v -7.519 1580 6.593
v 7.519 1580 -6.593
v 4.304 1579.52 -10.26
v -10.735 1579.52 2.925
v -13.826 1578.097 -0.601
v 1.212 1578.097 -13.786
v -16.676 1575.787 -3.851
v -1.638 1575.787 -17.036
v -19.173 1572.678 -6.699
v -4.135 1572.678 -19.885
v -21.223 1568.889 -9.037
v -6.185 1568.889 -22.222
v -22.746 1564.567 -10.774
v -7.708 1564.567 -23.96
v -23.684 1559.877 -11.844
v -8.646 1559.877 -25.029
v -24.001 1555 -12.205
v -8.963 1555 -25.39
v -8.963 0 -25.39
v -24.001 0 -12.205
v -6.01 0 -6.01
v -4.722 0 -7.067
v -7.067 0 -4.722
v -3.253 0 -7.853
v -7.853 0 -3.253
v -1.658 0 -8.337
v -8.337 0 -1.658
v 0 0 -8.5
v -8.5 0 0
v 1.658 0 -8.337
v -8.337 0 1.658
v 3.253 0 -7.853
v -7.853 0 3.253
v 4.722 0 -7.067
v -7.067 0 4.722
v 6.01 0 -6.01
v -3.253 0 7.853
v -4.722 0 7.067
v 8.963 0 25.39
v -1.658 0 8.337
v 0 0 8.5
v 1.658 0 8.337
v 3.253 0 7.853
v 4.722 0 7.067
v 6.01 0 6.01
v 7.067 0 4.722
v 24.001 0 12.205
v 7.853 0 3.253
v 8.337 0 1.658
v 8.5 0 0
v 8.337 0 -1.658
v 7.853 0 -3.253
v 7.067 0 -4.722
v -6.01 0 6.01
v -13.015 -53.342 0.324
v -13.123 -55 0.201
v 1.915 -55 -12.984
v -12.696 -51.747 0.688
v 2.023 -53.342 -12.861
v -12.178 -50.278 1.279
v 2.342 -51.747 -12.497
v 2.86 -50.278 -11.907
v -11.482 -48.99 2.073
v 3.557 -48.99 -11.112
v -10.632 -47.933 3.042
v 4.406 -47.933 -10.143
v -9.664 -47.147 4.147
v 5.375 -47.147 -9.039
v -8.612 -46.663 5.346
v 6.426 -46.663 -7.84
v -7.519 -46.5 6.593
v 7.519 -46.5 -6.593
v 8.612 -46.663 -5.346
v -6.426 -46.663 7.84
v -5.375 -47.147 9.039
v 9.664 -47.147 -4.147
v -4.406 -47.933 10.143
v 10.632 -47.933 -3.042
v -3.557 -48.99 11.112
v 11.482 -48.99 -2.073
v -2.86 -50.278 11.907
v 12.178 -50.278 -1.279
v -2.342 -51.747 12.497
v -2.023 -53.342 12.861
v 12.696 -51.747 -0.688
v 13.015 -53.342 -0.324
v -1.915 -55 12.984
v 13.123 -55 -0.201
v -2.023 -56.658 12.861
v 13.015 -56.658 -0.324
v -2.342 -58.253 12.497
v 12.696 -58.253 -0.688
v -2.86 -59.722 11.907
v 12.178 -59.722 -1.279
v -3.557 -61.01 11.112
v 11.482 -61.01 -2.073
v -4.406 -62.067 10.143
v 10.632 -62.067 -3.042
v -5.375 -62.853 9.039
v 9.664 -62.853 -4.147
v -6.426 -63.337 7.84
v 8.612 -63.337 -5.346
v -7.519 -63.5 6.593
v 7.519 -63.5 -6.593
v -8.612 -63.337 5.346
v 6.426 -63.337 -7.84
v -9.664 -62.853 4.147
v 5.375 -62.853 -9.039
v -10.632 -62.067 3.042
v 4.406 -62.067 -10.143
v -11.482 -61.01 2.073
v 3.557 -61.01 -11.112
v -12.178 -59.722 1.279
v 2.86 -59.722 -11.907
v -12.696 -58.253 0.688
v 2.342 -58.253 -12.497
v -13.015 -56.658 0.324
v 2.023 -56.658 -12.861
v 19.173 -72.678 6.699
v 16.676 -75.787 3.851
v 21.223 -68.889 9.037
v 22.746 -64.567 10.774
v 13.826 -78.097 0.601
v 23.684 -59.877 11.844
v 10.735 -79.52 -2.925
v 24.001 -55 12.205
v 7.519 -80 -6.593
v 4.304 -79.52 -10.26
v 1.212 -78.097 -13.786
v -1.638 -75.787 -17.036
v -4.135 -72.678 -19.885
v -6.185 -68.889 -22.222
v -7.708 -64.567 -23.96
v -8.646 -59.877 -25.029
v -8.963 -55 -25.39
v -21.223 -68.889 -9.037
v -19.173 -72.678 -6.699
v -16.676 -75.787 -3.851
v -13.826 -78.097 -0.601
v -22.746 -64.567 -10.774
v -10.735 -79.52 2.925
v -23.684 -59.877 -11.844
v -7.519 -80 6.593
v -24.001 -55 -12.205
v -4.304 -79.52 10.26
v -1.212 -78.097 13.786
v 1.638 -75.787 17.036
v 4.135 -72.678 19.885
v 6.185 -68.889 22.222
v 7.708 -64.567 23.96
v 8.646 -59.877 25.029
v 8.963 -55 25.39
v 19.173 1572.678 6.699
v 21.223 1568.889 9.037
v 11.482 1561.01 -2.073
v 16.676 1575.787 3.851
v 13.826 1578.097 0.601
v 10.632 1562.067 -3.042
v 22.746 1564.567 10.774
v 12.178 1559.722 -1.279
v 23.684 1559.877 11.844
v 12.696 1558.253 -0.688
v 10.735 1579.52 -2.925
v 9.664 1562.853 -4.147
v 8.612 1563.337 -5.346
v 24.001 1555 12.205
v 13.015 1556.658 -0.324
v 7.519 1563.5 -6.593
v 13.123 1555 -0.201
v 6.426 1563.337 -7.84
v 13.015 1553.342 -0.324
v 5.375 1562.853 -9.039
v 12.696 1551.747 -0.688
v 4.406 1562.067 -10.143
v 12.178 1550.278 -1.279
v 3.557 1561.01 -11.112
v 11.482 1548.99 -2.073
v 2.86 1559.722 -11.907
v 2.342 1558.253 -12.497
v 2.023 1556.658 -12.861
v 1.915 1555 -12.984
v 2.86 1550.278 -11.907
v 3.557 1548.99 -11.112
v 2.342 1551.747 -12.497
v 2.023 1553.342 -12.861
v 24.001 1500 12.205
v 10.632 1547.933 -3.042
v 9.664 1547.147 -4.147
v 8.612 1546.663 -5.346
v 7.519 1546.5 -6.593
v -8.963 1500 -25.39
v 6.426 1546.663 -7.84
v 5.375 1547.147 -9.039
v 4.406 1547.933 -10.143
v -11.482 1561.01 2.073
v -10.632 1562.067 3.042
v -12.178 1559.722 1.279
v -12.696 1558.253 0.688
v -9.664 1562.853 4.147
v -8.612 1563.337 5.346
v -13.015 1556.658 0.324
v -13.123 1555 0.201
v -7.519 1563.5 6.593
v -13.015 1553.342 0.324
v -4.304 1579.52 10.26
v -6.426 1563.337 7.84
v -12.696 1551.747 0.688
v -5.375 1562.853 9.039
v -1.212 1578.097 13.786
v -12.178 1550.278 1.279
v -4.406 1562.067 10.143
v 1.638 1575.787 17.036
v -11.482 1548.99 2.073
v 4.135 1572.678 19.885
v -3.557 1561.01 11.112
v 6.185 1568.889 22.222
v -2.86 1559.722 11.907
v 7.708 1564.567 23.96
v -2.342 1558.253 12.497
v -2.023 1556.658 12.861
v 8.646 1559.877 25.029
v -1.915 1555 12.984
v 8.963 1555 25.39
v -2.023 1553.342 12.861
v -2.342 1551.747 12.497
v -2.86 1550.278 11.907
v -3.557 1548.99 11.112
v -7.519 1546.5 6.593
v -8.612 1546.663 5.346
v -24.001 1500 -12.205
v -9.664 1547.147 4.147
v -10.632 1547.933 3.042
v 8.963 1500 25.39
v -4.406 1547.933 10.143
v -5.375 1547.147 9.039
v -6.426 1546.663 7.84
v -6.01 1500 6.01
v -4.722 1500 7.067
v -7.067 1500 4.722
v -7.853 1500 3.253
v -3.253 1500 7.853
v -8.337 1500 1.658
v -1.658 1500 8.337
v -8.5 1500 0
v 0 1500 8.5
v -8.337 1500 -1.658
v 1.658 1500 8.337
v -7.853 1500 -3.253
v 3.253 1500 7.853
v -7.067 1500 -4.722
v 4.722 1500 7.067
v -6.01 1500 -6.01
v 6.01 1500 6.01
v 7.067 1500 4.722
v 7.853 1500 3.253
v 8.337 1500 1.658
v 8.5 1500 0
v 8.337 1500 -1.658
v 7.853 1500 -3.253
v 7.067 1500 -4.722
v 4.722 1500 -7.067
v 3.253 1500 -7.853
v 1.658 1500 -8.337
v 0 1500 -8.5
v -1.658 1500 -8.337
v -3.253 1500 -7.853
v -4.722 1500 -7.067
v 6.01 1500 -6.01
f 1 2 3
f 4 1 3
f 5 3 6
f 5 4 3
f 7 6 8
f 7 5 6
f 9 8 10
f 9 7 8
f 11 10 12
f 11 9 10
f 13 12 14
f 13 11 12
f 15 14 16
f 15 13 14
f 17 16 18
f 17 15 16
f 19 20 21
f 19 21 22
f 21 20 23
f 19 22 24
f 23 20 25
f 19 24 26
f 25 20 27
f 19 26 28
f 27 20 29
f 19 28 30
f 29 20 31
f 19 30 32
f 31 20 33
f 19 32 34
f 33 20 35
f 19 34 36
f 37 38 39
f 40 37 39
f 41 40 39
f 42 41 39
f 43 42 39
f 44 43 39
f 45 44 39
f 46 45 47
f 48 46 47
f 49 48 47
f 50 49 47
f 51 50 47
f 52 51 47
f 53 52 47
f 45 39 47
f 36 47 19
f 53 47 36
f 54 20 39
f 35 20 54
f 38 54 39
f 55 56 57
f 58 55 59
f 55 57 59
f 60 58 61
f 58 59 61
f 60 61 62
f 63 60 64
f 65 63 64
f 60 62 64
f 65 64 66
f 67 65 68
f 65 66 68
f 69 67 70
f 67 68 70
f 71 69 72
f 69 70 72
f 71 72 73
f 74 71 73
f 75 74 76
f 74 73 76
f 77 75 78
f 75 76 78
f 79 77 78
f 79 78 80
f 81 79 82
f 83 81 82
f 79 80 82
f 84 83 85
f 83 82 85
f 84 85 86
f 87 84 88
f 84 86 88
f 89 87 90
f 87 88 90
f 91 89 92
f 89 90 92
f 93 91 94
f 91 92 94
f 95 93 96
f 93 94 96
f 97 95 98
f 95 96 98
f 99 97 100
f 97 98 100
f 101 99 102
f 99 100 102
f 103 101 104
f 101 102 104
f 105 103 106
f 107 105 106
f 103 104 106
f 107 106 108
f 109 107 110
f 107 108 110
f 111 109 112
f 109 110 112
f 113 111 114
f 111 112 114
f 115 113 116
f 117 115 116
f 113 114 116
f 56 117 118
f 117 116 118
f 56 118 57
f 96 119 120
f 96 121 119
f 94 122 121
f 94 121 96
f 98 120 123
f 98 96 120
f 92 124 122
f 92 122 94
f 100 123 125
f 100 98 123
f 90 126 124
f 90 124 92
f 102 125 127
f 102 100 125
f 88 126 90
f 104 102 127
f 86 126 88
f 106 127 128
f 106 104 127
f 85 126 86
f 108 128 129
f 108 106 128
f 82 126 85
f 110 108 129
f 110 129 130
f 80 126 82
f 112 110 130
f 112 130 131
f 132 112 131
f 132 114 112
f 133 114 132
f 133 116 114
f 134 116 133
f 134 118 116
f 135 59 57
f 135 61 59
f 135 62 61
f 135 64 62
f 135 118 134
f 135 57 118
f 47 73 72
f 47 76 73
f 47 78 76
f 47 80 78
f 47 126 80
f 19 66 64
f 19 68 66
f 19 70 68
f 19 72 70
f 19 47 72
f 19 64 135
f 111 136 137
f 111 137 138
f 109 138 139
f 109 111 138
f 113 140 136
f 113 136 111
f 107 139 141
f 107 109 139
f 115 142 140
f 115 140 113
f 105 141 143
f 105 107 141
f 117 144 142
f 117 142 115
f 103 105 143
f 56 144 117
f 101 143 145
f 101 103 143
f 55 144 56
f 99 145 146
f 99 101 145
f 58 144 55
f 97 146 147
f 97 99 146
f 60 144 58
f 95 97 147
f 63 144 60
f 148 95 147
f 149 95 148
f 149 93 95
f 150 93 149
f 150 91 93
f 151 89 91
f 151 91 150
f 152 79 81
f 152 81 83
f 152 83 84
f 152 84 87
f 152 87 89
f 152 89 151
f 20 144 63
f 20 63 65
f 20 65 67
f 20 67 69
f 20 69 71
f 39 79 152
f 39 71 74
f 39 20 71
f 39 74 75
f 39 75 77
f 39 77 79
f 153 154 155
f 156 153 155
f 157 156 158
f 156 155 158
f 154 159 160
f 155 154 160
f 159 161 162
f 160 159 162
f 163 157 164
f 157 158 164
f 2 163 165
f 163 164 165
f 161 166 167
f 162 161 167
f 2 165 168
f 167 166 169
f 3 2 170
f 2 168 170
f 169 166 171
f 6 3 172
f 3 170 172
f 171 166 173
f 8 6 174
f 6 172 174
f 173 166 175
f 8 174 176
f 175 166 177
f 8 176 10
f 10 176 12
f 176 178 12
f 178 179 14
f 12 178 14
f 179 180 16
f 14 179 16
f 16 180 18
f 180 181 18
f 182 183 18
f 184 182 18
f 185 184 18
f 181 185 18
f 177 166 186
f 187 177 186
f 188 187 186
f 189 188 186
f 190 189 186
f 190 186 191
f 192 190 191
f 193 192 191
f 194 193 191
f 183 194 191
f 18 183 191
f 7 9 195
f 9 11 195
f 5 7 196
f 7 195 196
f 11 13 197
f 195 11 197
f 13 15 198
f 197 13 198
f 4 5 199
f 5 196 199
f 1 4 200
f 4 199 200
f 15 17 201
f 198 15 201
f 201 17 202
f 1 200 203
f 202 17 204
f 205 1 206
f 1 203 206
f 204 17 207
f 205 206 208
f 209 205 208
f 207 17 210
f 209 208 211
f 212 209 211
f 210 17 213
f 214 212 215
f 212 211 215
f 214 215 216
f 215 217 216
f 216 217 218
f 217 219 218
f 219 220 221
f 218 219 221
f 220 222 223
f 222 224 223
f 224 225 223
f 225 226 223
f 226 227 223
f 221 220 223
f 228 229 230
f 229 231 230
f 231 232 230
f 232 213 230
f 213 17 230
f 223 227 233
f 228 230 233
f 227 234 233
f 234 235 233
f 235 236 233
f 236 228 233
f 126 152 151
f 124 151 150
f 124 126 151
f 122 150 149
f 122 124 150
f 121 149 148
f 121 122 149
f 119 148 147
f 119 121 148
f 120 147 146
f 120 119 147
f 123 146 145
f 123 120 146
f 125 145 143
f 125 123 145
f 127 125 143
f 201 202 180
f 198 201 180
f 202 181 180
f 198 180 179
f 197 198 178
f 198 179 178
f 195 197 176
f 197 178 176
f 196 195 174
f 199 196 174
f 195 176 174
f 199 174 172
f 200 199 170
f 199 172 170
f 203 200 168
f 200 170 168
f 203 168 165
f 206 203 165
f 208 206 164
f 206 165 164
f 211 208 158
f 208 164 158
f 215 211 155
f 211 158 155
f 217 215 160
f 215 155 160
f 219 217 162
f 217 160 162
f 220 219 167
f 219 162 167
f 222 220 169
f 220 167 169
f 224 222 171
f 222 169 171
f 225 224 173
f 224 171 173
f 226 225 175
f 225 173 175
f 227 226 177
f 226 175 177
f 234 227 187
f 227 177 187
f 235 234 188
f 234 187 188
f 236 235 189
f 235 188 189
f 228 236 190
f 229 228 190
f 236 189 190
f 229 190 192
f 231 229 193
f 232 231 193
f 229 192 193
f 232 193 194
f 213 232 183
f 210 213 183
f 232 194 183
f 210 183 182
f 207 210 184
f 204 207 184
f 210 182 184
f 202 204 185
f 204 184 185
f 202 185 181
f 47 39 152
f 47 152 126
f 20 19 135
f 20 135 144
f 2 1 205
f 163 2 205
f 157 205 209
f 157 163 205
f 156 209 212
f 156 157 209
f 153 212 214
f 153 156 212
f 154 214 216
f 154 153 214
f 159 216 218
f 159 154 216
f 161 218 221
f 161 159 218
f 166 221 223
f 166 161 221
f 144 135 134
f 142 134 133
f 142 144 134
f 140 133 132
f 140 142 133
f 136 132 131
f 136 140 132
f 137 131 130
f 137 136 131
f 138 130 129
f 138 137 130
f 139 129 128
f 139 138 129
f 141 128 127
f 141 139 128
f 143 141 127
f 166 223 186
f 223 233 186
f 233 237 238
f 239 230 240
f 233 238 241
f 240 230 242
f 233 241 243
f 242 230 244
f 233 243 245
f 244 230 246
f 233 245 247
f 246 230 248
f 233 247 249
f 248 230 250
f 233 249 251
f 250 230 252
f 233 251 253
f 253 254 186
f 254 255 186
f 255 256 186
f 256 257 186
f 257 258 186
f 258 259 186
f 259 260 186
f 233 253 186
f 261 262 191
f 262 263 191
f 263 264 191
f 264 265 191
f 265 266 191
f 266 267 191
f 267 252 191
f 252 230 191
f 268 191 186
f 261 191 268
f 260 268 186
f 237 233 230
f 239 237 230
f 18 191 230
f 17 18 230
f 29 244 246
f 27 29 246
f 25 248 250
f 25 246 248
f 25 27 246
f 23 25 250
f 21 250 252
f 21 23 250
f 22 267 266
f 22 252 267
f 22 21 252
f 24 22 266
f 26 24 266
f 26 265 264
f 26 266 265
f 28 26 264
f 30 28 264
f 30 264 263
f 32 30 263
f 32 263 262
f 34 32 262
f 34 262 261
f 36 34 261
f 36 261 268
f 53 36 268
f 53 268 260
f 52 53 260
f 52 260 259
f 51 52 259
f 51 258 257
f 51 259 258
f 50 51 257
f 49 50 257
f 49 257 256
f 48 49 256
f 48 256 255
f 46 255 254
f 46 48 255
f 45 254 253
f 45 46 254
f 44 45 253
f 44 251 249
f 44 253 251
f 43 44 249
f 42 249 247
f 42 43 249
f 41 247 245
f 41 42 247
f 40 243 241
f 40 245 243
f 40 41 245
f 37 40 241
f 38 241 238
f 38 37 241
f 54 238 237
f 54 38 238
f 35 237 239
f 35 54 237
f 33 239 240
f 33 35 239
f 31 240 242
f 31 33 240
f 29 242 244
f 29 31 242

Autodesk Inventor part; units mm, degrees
ref_plane "YZ Plane" through (0, 0, 0) normal (1, 0, 0) x (0, 1, 0)
ref_plane "XZ Plane" through (0, 0, 0) normal (0, 1, 0) x (-1, 0, 0)
ref_plane "XY Plane" through (0, 0, 0) normal (0, 0, 1) x (1, 0, 0)
sketch "Boceto1" plane through (0, 0, 0) normal (0, 1, 0) x (-1, 0, 0)
  circle A0 centre (0, 0) radius 8.5
  dimension "d0" = 17
extrude "Extrusión1" add sketch "Boceto1" along normal blind 1500
sketch "Boceto2" plane through (0, 1500, 0) normal (0, 1, 0) x (1, 0, 0)
  line L0 (24.0008, -12.205) -> (-8.9626, 25.3904)
  line L1 (-8.9626, 25.3904) -> (-24.0008, 12.205)
  line L2 (-24.0008, 12.205) -> (8.9626, -25.3904)
  line L3 (8.9626, -25.3904) -> (24.0008, -12.205)
  line L4 (24.0008, -12.205) -> (-24.0008, 12.205) construction
  line L5 (-8.9626, 25.3904) -> (8.9626, -25.3904) construction
  point P0 (0, 0)
  dimension "d3" = 20
  dimension "d4" = 50
extrude "Extrusión2" add sketch "Boceto2" along normal blind 80
sketch "Boceto3" plane through (-8.9626, 1500, -25.3904) normal (0.7519079, 0, -0.6592681) x (-0.6592681, 0, -0.7519079)
  circle A0 centre (-25, 55) radius 8.5
  line L0 (-50, 80) -> (0, 80) projected
  line L1 (0, 0) -> (0, 80) projected
  point P0 (-25, -1500)
  dimension "d7" = 17
  dimension "d8" = 25
  dimension "d9" = 25
extrude "Extrusión3" cut sketch "Boceto3" against normal blind 80
fillet "Empalme1" radius 25 2 edges at (-16.4817, 1580, -18.7977) (16.4817, 1580, 18.7977)
sketch "Boceto4" plane through (0, 0, 0) normal (0, -1, 0) x (1, 0, 0)
  line L0 (-8.9626, -25.3904) -> (-24.0008, -12.205) projected
  line L1 (24.0008, 12.205) -> (-8.9626, -25.3904) projected
  line L2 (8.9626, 25.3904) -> (24.0008, 12.205) projected
  line L3 (-24.0008, -12.205) -> (8.9626, 25.3904) projected
  circle A0 centre (0, 0) radius 8.5 projected
  line L4 (24.0008, 12.205) -> (-8.9626, -25.3904) projected
  line L5 (24.0008, 12.205) -> (-8.9626, -25.3904)
  line L6 (-8.9626, -25.3904) -> (-24.0008, -12.205) projected
  line L7 (-8.9626, -25.3904) -> (-24.0008, -12.205)
  line L8 (-24.0008, -12.205) -> (8.9626, 25.3904) projected
  line L9 (-24.0008, -12.205) -> (8.9626, 25.3904)
  line L10 (8.9626, 25.3904) -> (24.0008, 12.205) projected
  line L11 (8.9626, 25.3904) -> (24.0008, 12.205)
extrude "Extrusión4" add sketch "Boceto4" along normal blind 80 contours L0 L3 L2 L1 | A0
sketch "Boceto5" plane through (24.0008, -80, 12.205) normal (0.7519079, 0, -0.6592681) x (-0.6592681, 0, -0.7519079)
  circle A0 centre (25, 25) radius 8.5
  line L0 (0, 80) -> (0, 0) projected
  line L1 (50, 0) -> (0, 0) projected
  point P0 (25, 80)
  dimension "d15" = 17
  dimension "d16" = 25
  dimension "d17" = 25
extrude "Extrusión5" cut sketch "Boceto5" against normal blind 80
fillet "Empalme2" radius 25 2 edges at (-16.4817, -80, -18.7977) (16.4817, -80, 18.7977)
properties part number "04_10 Cable" material "Acero ASTM A36"
